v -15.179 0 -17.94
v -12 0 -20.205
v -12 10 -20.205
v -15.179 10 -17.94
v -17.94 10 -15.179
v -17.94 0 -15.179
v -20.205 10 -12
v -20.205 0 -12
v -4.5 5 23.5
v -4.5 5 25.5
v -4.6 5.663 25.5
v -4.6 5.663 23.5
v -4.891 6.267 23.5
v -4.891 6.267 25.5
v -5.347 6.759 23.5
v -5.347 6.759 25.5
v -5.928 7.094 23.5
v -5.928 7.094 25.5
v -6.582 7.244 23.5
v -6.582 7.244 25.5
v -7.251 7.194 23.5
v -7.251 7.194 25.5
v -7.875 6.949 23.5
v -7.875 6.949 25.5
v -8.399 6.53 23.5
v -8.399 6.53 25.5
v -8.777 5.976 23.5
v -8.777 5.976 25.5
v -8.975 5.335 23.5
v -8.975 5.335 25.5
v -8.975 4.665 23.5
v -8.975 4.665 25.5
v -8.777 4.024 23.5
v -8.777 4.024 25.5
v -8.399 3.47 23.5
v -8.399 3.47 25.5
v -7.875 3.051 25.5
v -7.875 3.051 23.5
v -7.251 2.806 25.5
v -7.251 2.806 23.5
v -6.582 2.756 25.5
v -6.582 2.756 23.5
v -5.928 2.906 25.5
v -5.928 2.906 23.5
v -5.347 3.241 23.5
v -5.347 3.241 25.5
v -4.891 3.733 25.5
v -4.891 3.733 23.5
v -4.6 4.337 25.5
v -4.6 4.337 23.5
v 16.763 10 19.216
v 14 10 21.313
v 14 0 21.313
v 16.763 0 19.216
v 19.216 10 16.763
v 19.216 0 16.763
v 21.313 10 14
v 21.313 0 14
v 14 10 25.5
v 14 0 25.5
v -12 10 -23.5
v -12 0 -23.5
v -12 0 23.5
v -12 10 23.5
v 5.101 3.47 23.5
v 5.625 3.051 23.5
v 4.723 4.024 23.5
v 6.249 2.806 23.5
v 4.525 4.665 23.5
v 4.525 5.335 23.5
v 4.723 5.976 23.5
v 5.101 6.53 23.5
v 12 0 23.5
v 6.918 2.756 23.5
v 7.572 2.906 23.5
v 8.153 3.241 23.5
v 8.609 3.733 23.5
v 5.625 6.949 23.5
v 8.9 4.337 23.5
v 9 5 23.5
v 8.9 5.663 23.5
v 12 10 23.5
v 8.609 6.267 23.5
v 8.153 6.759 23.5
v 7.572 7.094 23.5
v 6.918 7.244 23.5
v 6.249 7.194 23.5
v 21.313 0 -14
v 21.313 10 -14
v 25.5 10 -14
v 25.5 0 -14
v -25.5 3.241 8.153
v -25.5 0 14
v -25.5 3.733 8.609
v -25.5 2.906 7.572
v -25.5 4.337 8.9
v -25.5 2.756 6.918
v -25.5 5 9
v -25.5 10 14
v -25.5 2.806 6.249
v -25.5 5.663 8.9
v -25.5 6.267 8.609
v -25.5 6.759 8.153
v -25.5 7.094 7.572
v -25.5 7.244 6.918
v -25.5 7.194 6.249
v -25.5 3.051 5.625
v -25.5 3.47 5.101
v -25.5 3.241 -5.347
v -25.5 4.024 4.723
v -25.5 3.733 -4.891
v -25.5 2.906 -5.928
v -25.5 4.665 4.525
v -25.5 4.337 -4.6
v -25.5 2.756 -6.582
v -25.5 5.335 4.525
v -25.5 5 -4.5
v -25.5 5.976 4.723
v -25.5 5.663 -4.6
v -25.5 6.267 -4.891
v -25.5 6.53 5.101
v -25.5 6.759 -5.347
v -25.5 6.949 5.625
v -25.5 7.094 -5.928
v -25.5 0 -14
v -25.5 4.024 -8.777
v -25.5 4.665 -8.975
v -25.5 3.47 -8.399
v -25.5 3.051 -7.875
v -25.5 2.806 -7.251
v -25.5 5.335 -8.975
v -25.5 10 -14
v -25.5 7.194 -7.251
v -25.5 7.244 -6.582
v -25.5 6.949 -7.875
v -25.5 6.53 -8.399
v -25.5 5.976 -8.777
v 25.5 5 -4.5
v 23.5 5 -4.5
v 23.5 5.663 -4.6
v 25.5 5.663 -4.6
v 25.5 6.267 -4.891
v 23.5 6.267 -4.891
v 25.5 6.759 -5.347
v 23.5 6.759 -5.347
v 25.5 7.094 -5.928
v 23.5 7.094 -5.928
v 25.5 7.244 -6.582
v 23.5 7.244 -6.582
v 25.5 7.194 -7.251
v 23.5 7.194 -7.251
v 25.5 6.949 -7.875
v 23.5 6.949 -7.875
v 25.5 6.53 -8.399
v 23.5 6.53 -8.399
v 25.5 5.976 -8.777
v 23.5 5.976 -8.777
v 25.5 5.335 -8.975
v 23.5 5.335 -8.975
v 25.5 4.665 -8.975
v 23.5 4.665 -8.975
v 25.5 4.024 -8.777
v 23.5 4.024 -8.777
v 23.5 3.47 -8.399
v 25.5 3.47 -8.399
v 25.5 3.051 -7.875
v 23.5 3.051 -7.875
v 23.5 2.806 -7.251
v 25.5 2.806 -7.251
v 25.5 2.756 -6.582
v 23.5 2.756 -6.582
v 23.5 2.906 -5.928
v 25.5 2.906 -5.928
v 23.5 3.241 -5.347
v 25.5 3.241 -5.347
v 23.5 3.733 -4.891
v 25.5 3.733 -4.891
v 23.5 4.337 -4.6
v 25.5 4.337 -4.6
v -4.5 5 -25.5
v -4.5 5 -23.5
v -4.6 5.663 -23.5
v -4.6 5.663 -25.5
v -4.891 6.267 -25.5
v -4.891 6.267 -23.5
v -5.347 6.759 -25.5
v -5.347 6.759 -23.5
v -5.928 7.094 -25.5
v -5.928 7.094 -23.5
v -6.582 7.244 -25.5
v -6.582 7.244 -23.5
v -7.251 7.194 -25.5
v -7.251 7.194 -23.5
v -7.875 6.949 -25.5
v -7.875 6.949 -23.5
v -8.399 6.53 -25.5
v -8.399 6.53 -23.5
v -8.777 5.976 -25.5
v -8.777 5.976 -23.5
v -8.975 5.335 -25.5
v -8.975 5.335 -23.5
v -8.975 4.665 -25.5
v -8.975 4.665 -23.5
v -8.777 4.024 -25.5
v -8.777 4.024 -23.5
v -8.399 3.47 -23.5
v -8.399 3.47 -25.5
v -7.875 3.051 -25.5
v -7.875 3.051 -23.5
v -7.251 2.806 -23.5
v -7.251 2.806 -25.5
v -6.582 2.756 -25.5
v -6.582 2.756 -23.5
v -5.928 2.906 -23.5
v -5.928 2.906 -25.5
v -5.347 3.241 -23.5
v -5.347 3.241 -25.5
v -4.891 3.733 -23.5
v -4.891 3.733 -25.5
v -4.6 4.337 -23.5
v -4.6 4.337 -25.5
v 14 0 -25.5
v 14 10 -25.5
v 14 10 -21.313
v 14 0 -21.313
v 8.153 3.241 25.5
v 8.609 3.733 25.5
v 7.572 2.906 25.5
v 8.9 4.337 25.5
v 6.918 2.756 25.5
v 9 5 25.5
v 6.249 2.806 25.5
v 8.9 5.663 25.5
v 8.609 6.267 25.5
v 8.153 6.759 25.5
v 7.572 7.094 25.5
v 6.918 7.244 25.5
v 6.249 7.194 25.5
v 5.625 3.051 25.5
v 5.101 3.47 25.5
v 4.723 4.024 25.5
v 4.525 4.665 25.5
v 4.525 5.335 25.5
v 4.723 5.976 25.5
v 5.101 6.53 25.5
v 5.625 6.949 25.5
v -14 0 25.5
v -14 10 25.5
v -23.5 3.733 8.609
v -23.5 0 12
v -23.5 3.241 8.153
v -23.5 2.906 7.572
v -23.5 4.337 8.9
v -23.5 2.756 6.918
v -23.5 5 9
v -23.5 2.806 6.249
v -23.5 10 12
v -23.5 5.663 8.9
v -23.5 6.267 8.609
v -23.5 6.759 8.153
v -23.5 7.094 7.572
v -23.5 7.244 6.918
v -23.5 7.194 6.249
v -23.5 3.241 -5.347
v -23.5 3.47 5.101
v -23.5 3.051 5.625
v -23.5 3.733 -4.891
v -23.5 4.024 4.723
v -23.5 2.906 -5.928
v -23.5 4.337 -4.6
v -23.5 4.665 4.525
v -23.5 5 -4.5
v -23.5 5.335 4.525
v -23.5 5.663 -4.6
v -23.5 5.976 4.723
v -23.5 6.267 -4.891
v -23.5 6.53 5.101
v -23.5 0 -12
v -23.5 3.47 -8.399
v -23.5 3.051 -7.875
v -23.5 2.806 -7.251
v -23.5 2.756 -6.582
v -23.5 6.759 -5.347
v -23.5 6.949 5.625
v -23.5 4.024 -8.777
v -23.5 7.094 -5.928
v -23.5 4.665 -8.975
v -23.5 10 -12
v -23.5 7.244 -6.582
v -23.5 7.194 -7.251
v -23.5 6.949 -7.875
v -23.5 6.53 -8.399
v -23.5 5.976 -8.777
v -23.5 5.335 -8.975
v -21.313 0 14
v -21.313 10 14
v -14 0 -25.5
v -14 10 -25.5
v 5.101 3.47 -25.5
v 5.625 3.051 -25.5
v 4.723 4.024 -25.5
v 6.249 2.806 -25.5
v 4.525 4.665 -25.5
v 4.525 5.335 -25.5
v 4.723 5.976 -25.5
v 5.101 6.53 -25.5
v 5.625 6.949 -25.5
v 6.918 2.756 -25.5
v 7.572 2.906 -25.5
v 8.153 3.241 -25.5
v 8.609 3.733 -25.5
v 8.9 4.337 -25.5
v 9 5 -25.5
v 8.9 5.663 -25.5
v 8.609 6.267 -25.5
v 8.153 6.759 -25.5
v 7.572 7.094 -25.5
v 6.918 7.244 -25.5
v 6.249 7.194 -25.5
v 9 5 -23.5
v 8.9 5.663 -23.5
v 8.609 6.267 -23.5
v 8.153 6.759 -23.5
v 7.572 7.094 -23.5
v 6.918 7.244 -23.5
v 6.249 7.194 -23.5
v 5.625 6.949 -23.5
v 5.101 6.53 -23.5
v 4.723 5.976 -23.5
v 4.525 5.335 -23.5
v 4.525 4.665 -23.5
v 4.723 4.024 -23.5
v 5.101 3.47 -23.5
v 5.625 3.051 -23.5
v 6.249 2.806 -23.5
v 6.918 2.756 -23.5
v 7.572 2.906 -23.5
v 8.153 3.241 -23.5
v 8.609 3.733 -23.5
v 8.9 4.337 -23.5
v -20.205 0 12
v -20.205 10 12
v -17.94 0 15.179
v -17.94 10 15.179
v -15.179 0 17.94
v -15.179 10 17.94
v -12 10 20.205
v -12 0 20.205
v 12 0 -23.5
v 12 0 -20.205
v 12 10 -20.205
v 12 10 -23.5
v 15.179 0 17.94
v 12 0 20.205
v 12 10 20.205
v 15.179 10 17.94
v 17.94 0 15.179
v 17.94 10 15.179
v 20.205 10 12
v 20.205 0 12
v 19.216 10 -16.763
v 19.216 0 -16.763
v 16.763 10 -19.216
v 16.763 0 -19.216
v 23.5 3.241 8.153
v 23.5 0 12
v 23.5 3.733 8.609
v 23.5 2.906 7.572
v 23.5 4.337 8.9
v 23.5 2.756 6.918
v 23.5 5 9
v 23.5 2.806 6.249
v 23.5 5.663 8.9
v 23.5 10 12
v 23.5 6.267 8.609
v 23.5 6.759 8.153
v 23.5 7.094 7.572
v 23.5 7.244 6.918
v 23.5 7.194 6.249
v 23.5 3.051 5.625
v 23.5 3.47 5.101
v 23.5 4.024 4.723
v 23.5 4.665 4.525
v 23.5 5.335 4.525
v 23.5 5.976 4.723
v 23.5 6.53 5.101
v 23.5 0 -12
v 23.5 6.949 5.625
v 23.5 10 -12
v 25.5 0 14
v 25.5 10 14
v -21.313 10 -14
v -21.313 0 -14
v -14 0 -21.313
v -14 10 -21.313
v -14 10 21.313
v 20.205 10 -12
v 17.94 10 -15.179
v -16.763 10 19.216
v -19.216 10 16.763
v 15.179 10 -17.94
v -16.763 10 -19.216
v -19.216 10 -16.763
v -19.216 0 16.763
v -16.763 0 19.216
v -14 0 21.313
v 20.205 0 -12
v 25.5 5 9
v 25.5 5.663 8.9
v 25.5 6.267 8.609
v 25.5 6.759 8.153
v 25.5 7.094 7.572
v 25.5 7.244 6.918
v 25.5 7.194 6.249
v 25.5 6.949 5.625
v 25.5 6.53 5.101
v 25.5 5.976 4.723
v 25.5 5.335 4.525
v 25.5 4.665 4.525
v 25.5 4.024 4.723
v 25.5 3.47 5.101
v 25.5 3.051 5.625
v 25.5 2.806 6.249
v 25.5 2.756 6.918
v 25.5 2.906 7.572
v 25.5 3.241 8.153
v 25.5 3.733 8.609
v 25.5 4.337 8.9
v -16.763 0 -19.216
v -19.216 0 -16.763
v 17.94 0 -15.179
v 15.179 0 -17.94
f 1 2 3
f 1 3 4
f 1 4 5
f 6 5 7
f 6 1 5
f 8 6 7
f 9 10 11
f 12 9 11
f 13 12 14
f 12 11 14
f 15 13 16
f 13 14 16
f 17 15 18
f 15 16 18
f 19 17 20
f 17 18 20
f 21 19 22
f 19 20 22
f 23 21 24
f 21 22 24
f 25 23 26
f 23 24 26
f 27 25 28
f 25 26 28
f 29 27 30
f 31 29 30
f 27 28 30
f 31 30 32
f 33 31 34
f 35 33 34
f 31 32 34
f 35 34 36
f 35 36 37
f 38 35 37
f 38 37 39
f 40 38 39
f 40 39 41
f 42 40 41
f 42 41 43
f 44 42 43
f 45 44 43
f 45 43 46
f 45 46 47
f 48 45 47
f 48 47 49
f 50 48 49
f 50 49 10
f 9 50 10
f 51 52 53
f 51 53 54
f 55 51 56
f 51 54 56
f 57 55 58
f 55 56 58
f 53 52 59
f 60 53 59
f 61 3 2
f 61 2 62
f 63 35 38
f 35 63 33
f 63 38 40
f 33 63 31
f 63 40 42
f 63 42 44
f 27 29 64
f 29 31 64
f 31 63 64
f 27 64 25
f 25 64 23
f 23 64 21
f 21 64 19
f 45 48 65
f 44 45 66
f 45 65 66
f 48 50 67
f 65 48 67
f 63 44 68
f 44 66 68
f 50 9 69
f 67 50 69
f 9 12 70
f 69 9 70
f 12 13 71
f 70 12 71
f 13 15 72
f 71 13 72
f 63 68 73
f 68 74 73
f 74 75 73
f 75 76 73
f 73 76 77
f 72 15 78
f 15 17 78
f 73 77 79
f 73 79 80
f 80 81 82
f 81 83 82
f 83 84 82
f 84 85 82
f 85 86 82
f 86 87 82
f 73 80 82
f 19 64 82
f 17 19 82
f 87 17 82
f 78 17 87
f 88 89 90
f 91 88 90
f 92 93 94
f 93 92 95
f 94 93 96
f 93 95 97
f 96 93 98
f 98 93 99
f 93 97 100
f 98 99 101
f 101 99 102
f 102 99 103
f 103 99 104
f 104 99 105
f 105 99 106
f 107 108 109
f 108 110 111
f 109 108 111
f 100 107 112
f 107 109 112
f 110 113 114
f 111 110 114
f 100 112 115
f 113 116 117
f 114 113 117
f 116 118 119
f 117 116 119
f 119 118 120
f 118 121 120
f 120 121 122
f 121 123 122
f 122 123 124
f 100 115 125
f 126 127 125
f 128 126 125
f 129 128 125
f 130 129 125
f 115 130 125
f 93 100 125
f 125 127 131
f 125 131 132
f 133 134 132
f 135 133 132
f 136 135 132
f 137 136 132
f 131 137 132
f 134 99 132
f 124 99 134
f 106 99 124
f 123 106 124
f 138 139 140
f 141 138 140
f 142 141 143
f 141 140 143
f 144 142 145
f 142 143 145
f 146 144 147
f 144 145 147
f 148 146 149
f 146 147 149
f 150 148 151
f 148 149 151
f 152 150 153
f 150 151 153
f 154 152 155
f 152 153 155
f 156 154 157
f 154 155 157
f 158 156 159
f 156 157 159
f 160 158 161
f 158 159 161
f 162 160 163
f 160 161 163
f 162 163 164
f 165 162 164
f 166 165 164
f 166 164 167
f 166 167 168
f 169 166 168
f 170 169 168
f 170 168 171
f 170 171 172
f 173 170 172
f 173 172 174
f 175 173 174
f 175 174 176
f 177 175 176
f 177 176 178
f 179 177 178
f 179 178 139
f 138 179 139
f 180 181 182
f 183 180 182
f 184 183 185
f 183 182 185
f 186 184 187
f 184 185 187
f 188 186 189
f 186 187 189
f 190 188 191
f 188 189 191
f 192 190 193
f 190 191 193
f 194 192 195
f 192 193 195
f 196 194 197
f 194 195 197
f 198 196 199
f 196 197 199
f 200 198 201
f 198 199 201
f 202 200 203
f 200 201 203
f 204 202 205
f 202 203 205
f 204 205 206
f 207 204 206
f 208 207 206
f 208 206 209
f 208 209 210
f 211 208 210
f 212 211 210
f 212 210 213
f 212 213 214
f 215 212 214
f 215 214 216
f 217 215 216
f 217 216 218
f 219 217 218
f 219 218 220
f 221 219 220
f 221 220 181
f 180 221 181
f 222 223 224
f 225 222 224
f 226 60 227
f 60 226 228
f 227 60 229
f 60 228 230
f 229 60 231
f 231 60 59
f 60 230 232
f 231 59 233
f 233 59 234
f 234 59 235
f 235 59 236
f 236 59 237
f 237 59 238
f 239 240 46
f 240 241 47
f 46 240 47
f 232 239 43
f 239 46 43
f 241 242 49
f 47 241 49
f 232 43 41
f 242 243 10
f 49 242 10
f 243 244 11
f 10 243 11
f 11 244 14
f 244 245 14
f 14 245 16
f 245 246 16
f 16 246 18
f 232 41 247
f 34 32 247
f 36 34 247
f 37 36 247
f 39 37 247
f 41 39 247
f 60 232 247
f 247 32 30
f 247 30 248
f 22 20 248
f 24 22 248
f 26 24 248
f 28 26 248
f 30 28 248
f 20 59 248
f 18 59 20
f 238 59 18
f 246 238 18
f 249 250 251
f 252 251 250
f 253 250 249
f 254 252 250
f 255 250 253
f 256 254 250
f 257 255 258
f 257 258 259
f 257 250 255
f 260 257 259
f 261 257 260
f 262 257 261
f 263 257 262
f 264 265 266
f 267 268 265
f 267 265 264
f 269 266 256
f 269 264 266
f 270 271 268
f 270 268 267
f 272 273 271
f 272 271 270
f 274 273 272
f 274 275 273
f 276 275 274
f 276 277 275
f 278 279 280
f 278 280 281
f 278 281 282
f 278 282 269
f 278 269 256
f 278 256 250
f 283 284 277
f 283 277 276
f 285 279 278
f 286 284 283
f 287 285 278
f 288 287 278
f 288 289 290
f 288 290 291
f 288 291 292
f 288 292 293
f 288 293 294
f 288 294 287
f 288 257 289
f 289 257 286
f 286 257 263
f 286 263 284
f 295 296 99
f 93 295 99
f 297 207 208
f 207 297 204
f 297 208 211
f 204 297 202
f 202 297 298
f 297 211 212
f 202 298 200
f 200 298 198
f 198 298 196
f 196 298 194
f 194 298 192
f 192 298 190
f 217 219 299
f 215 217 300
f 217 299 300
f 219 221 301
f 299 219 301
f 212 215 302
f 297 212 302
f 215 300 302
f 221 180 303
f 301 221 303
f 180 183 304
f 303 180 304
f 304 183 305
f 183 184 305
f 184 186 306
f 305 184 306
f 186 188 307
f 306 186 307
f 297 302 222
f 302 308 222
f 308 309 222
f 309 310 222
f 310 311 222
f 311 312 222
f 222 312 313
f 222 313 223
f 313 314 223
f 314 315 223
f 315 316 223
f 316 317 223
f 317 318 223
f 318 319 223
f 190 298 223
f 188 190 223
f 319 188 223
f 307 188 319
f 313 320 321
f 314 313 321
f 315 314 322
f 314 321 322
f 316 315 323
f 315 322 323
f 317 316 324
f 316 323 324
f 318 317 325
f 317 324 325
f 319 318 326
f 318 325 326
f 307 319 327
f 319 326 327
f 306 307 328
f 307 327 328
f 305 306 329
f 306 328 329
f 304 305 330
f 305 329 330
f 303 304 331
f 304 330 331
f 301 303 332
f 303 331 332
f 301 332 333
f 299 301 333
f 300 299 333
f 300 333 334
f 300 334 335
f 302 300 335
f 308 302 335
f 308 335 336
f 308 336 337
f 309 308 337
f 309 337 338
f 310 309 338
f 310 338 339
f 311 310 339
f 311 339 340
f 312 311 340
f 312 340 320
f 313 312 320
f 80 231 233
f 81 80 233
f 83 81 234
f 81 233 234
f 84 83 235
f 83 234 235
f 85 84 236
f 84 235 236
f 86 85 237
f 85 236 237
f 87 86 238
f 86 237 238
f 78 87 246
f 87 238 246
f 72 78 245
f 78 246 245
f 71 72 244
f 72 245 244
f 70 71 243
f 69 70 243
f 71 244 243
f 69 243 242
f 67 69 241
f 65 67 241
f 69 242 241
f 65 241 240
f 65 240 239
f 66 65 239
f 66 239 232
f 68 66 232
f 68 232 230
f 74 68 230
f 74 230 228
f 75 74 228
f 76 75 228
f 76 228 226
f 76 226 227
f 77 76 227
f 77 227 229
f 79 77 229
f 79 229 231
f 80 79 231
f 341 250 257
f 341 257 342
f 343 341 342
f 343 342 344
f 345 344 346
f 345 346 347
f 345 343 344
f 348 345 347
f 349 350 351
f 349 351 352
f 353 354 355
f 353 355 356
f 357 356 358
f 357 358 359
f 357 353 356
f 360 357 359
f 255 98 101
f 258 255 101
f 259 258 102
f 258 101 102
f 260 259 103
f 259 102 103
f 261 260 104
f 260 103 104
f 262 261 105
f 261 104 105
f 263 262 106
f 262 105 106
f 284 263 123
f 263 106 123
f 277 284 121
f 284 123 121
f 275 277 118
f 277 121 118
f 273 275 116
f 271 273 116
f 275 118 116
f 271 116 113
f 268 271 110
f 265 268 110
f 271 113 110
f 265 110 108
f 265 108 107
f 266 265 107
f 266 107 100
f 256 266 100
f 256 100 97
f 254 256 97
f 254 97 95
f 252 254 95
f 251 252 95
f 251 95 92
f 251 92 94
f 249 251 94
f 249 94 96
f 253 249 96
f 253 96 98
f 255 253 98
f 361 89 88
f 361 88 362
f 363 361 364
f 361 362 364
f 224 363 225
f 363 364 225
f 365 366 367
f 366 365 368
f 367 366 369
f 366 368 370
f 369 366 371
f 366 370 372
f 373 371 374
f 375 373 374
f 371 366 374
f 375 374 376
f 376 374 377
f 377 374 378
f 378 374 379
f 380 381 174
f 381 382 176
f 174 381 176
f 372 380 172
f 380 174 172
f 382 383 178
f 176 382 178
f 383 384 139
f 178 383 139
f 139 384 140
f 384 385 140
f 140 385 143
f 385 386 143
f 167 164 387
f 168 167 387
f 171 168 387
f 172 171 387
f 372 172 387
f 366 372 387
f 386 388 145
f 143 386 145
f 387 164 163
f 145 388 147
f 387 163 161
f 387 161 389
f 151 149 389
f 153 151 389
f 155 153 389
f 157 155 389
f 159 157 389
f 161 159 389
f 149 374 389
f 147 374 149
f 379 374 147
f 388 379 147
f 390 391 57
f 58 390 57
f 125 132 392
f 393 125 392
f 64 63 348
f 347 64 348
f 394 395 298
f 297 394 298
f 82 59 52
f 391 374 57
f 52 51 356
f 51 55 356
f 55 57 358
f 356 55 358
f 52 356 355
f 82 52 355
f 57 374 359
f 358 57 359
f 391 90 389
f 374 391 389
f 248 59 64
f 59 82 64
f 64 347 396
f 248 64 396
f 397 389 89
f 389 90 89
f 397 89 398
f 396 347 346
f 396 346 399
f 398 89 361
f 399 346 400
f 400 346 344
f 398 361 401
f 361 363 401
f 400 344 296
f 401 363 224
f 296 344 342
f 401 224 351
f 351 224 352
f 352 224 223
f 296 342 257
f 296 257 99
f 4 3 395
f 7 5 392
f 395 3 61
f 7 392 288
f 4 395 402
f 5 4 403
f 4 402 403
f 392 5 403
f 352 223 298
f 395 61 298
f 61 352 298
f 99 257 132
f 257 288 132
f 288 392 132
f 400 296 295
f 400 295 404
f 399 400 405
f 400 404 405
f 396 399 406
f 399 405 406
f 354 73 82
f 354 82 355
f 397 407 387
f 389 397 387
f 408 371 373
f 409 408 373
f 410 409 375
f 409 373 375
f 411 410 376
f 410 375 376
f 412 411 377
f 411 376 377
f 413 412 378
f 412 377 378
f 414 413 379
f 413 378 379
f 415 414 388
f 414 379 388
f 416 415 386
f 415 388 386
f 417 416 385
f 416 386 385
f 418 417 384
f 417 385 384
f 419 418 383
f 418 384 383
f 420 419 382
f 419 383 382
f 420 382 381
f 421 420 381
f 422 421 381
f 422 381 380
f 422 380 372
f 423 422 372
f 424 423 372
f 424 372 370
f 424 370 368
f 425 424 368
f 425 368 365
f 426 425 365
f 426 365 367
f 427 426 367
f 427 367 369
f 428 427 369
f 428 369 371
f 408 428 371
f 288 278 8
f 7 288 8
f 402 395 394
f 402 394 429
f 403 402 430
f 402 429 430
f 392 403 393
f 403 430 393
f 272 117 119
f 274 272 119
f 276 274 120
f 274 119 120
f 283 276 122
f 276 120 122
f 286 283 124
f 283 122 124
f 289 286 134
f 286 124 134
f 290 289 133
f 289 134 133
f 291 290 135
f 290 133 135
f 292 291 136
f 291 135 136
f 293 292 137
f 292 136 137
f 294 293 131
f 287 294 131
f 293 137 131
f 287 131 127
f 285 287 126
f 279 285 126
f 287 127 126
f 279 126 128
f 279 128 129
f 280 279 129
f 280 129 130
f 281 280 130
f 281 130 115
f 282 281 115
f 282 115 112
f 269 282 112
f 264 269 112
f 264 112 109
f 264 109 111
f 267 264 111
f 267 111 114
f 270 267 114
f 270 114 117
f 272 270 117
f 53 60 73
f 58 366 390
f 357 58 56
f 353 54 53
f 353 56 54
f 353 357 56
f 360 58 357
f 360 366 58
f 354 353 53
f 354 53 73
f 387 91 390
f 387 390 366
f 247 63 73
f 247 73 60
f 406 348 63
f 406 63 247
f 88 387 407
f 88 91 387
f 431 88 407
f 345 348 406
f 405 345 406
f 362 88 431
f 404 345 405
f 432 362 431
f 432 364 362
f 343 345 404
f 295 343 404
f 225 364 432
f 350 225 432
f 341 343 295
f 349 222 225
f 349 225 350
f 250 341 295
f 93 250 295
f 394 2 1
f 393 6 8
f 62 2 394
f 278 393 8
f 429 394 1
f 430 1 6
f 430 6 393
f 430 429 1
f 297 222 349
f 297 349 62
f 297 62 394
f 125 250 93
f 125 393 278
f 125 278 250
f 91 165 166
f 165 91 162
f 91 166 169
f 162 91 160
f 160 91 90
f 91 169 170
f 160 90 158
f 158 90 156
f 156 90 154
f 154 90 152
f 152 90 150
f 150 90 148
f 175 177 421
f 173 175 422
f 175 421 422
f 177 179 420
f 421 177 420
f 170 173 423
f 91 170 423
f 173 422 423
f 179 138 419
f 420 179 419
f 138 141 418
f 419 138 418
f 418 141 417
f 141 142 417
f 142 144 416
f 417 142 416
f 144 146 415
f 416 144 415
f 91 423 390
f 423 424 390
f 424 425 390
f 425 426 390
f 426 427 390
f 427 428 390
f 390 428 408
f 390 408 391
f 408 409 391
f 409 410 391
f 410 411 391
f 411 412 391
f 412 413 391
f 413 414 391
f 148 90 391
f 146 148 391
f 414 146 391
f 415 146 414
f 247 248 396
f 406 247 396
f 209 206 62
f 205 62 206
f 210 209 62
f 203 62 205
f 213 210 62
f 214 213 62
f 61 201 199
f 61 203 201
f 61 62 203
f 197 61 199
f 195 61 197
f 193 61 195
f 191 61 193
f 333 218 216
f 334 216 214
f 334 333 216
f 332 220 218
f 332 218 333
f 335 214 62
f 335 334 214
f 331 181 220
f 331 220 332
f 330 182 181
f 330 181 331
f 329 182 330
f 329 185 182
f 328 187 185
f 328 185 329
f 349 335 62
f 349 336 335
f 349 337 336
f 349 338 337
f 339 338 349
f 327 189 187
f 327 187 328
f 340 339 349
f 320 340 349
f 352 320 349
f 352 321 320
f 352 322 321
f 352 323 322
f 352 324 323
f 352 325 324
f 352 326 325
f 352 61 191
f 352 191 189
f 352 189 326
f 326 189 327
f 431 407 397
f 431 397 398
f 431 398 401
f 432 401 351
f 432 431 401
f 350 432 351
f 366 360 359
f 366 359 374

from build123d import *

# Parameters (mm, degrees)
SKETCH_1_R          = 25.5
SKETCH_1_R_2        = 23.5
EXTRUDE_1_DEPTH     = 10
EXTRUDE_2_DEPTH     = 10
SKETCH_3_R          = 2.25
CUT_EXTRUDE_1_DEPTH = 52
SKETCH_4_R          = 2.25
CUT_EXTRUDE_2_DEPTH = 52
SKETCH_7_W          = 24
SKETCH_7_H          = 3.731601122
SKETCH_7_W_2        = 3.731601122
SKETCH_7_H_2        = 24
CUT_EXTRUDE_4_DEPTH = 11.0000001


with BuildPart() as part:
    # 草图1 → 凸台-拉伸1 (new body)
    with BuildSketch(Plane(origin=(0, 0, 0), x_dir=(1, 0, 0), z_dir=(0, 1, 0))):
        Circle(SKETCH_1_R)
        Circle(SKETCH_1_R_2, mode=Mode.SUBTRACT)
    extrude(amount=EXTRUDE_1_DEPTH)

    # 草图2 → 凸台-拉伸2 (add)
    with BuildSketch(Plane(origin=(0, 10, 0), x_dir=(1, 0, 0), z_dir=(0, 1, 0))):
        with BuildLine():
            Line((-14, 25.5), (14, 25.5))
            Line((14, 25.5), (14, 20.205197351))
            ThreePointArc((14, 20.205197351), (0, 24.581497107), (-14, 20.205197351))
            Line((-14, 20.205197351), (-14, 25.5))
        make_face()
        with BuildLine():
            Line((20.205197351, 14), (25.5, 14))
            Line((25.5, 14), (25.5, -14))
            Line((25.5, -14), (20.205197351, -14))
            ThreePointArc((20.205197351, -14), (24.581497107, 0), (20.205197351, 14))
        make_face()
        with BuildLine():
            Line((14, -20.205197351), (14, -25.5))
            Line((14, -25.5), (-14, -25.5))
            Line((-14, -25.5), (-14, -20.205197351))
            ThreePointArc((-14, -20.205197351), (0, -24.581497107), (14, -20.205197351))
        make_face()
        with BuildLine():
            Line((-20.205197351, -14), (-25.5, -14))
            Line((-25.5, -14), (-25.5, 14))
            Line((-25.5, 14), (-20.205197351, 14))
            ThreePointArc((-20.205197351, 14), (-24.581497107, 0), (-20.205197351, -14))
        make_face()
    extrude(amount=-EXTRUDE_2_DEPTH)

    # 草图3 → 切除-拉伸1 (cut, through all)
    with BuildSketch(Plane.XY.offset(25.5)):
        with Locations((-6.75, 5)):
            Circle(SKETCH_3_R)
        with Locations((6.75, 5)):
            Circle(SKETCH_3_R)
    extrude(amount=-CUT_EXTRUDE_1_DEPTH, mode=Mode.SUBTRACT)

    # 草图4 → 切除-拉伸2 (cut, through all)
    with BuildSketch(Plane.ZY.offset(25.5)):
        with Locations((-6.75, 5)):
            Circle(SKETCH_4_R)
        with Locations((6.75, 5)):
            Circle(SKETCH_4_R)
    extrude(amount=-CUT_EXTRUDE_2_DEPTH, mode=Mode.SUBTRACT)

    # 草图7 → 切除-拉伸4 (cut, through all)
    with BuildSketch(Plane(origin=(0, 10, 0), x_dir=(1, 0, 0), z_dir=(0, 1, 0))):
        with Locations((0, 21.634199439)):
            Rectangle(SKETCH_7_W, SKETCH_7_H)
        with Locations((21.634199439, 0)):
            Rectangle(SKETCH_7_W_2, SKETCH_7_H_2)
        with Locations((0, -21.634199439)):
            Rectangle(SKETCH_7_W, SKETCH_7_H)
        with Locations((-21.634199439, 0)):
            Rectangle(SKETCH_7_W_2, SKETCH_7_H_2)
    extrude(amount=-CUT_EXTRUDE_4_DEPTH, mode=Mode.SUBTRACT)


solid = part.part
